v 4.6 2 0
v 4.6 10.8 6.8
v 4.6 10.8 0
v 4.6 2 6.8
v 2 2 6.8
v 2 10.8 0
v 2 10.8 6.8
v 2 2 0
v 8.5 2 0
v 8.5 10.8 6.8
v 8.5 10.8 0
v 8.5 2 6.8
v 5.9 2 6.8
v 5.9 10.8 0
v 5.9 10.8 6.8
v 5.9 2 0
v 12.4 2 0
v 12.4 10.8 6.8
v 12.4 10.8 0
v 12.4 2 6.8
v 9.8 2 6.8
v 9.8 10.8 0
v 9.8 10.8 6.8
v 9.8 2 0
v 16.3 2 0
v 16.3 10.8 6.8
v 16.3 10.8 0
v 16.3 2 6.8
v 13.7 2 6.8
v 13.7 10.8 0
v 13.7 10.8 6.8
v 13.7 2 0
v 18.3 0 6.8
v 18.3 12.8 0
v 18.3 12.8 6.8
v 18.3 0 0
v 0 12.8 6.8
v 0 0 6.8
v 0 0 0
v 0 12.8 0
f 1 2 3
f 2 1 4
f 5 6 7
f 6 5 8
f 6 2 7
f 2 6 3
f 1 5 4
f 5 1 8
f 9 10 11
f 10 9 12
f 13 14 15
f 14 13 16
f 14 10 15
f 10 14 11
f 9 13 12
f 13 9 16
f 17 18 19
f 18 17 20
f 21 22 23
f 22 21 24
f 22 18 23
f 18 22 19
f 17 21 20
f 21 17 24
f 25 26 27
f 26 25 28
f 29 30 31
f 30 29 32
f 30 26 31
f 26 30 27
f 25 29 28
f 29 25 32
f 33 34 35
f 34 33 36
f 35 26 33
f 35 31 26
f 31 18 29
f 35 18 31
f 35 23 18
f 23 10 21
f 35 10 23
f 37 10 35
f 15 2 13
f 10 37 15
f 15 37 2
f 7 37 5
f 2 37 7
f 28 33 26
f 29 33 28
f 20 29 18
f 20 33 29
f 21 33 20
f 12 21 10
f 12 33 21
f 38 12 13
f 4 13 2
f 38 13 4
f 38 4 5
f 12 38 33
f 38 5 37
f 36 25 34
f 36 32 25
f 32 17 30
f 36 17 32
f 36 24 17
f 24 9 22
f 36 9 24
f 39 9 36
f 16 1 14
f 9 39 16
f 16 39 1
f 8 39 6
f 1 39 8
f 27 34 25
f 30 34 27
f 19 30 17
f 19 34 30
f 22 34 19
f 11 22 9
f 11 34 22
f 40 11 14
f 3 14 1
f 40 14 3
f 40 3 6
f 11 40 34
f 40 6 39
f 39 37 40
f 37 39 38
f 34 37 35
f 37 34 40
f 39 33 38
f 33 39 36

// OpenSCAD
// $fn = 256;
$fn = 128;
// $fn = 64;
//$fn = 32;
//$fn = 16;

wall_thickness = 2;
inner_female = [15.5, 10.7, 18];
// inner_female = [15.5, 10.5, 5];

male_separator = 1.3;

inner_male_slot = [2.6, 8.8, 7];

module female() {
  difference() {
    cube(inner_female + [2 * wall_thickness, 2 * wall_thickness, wall_thickness]);
    translate([wall_thickness, wall_thickness, -0.1]) {
      cube(inner_female);
      translate([0.5, 1, 2 * wall_thickness])
        cube(inner_female - [1, 2, 0]);
    }
  }
}

module male() {
  difference() {
    cube([(4 * inner_male_slot[0]) + (3 * male_separator) + 2 * wall_thickness,
          inner_male_slot[1] + 2 * wall_thickness, inner_male_slot[2] - 0.2]);
    translate([wall_thickness, wall_thickness, -0.1])
    for (i = [0 : 3])
      translate([i * (inner_male_slot[0] + male_separator), 0, 0])
        cube(inner_male_slot);
  }
}

// female();
male();
